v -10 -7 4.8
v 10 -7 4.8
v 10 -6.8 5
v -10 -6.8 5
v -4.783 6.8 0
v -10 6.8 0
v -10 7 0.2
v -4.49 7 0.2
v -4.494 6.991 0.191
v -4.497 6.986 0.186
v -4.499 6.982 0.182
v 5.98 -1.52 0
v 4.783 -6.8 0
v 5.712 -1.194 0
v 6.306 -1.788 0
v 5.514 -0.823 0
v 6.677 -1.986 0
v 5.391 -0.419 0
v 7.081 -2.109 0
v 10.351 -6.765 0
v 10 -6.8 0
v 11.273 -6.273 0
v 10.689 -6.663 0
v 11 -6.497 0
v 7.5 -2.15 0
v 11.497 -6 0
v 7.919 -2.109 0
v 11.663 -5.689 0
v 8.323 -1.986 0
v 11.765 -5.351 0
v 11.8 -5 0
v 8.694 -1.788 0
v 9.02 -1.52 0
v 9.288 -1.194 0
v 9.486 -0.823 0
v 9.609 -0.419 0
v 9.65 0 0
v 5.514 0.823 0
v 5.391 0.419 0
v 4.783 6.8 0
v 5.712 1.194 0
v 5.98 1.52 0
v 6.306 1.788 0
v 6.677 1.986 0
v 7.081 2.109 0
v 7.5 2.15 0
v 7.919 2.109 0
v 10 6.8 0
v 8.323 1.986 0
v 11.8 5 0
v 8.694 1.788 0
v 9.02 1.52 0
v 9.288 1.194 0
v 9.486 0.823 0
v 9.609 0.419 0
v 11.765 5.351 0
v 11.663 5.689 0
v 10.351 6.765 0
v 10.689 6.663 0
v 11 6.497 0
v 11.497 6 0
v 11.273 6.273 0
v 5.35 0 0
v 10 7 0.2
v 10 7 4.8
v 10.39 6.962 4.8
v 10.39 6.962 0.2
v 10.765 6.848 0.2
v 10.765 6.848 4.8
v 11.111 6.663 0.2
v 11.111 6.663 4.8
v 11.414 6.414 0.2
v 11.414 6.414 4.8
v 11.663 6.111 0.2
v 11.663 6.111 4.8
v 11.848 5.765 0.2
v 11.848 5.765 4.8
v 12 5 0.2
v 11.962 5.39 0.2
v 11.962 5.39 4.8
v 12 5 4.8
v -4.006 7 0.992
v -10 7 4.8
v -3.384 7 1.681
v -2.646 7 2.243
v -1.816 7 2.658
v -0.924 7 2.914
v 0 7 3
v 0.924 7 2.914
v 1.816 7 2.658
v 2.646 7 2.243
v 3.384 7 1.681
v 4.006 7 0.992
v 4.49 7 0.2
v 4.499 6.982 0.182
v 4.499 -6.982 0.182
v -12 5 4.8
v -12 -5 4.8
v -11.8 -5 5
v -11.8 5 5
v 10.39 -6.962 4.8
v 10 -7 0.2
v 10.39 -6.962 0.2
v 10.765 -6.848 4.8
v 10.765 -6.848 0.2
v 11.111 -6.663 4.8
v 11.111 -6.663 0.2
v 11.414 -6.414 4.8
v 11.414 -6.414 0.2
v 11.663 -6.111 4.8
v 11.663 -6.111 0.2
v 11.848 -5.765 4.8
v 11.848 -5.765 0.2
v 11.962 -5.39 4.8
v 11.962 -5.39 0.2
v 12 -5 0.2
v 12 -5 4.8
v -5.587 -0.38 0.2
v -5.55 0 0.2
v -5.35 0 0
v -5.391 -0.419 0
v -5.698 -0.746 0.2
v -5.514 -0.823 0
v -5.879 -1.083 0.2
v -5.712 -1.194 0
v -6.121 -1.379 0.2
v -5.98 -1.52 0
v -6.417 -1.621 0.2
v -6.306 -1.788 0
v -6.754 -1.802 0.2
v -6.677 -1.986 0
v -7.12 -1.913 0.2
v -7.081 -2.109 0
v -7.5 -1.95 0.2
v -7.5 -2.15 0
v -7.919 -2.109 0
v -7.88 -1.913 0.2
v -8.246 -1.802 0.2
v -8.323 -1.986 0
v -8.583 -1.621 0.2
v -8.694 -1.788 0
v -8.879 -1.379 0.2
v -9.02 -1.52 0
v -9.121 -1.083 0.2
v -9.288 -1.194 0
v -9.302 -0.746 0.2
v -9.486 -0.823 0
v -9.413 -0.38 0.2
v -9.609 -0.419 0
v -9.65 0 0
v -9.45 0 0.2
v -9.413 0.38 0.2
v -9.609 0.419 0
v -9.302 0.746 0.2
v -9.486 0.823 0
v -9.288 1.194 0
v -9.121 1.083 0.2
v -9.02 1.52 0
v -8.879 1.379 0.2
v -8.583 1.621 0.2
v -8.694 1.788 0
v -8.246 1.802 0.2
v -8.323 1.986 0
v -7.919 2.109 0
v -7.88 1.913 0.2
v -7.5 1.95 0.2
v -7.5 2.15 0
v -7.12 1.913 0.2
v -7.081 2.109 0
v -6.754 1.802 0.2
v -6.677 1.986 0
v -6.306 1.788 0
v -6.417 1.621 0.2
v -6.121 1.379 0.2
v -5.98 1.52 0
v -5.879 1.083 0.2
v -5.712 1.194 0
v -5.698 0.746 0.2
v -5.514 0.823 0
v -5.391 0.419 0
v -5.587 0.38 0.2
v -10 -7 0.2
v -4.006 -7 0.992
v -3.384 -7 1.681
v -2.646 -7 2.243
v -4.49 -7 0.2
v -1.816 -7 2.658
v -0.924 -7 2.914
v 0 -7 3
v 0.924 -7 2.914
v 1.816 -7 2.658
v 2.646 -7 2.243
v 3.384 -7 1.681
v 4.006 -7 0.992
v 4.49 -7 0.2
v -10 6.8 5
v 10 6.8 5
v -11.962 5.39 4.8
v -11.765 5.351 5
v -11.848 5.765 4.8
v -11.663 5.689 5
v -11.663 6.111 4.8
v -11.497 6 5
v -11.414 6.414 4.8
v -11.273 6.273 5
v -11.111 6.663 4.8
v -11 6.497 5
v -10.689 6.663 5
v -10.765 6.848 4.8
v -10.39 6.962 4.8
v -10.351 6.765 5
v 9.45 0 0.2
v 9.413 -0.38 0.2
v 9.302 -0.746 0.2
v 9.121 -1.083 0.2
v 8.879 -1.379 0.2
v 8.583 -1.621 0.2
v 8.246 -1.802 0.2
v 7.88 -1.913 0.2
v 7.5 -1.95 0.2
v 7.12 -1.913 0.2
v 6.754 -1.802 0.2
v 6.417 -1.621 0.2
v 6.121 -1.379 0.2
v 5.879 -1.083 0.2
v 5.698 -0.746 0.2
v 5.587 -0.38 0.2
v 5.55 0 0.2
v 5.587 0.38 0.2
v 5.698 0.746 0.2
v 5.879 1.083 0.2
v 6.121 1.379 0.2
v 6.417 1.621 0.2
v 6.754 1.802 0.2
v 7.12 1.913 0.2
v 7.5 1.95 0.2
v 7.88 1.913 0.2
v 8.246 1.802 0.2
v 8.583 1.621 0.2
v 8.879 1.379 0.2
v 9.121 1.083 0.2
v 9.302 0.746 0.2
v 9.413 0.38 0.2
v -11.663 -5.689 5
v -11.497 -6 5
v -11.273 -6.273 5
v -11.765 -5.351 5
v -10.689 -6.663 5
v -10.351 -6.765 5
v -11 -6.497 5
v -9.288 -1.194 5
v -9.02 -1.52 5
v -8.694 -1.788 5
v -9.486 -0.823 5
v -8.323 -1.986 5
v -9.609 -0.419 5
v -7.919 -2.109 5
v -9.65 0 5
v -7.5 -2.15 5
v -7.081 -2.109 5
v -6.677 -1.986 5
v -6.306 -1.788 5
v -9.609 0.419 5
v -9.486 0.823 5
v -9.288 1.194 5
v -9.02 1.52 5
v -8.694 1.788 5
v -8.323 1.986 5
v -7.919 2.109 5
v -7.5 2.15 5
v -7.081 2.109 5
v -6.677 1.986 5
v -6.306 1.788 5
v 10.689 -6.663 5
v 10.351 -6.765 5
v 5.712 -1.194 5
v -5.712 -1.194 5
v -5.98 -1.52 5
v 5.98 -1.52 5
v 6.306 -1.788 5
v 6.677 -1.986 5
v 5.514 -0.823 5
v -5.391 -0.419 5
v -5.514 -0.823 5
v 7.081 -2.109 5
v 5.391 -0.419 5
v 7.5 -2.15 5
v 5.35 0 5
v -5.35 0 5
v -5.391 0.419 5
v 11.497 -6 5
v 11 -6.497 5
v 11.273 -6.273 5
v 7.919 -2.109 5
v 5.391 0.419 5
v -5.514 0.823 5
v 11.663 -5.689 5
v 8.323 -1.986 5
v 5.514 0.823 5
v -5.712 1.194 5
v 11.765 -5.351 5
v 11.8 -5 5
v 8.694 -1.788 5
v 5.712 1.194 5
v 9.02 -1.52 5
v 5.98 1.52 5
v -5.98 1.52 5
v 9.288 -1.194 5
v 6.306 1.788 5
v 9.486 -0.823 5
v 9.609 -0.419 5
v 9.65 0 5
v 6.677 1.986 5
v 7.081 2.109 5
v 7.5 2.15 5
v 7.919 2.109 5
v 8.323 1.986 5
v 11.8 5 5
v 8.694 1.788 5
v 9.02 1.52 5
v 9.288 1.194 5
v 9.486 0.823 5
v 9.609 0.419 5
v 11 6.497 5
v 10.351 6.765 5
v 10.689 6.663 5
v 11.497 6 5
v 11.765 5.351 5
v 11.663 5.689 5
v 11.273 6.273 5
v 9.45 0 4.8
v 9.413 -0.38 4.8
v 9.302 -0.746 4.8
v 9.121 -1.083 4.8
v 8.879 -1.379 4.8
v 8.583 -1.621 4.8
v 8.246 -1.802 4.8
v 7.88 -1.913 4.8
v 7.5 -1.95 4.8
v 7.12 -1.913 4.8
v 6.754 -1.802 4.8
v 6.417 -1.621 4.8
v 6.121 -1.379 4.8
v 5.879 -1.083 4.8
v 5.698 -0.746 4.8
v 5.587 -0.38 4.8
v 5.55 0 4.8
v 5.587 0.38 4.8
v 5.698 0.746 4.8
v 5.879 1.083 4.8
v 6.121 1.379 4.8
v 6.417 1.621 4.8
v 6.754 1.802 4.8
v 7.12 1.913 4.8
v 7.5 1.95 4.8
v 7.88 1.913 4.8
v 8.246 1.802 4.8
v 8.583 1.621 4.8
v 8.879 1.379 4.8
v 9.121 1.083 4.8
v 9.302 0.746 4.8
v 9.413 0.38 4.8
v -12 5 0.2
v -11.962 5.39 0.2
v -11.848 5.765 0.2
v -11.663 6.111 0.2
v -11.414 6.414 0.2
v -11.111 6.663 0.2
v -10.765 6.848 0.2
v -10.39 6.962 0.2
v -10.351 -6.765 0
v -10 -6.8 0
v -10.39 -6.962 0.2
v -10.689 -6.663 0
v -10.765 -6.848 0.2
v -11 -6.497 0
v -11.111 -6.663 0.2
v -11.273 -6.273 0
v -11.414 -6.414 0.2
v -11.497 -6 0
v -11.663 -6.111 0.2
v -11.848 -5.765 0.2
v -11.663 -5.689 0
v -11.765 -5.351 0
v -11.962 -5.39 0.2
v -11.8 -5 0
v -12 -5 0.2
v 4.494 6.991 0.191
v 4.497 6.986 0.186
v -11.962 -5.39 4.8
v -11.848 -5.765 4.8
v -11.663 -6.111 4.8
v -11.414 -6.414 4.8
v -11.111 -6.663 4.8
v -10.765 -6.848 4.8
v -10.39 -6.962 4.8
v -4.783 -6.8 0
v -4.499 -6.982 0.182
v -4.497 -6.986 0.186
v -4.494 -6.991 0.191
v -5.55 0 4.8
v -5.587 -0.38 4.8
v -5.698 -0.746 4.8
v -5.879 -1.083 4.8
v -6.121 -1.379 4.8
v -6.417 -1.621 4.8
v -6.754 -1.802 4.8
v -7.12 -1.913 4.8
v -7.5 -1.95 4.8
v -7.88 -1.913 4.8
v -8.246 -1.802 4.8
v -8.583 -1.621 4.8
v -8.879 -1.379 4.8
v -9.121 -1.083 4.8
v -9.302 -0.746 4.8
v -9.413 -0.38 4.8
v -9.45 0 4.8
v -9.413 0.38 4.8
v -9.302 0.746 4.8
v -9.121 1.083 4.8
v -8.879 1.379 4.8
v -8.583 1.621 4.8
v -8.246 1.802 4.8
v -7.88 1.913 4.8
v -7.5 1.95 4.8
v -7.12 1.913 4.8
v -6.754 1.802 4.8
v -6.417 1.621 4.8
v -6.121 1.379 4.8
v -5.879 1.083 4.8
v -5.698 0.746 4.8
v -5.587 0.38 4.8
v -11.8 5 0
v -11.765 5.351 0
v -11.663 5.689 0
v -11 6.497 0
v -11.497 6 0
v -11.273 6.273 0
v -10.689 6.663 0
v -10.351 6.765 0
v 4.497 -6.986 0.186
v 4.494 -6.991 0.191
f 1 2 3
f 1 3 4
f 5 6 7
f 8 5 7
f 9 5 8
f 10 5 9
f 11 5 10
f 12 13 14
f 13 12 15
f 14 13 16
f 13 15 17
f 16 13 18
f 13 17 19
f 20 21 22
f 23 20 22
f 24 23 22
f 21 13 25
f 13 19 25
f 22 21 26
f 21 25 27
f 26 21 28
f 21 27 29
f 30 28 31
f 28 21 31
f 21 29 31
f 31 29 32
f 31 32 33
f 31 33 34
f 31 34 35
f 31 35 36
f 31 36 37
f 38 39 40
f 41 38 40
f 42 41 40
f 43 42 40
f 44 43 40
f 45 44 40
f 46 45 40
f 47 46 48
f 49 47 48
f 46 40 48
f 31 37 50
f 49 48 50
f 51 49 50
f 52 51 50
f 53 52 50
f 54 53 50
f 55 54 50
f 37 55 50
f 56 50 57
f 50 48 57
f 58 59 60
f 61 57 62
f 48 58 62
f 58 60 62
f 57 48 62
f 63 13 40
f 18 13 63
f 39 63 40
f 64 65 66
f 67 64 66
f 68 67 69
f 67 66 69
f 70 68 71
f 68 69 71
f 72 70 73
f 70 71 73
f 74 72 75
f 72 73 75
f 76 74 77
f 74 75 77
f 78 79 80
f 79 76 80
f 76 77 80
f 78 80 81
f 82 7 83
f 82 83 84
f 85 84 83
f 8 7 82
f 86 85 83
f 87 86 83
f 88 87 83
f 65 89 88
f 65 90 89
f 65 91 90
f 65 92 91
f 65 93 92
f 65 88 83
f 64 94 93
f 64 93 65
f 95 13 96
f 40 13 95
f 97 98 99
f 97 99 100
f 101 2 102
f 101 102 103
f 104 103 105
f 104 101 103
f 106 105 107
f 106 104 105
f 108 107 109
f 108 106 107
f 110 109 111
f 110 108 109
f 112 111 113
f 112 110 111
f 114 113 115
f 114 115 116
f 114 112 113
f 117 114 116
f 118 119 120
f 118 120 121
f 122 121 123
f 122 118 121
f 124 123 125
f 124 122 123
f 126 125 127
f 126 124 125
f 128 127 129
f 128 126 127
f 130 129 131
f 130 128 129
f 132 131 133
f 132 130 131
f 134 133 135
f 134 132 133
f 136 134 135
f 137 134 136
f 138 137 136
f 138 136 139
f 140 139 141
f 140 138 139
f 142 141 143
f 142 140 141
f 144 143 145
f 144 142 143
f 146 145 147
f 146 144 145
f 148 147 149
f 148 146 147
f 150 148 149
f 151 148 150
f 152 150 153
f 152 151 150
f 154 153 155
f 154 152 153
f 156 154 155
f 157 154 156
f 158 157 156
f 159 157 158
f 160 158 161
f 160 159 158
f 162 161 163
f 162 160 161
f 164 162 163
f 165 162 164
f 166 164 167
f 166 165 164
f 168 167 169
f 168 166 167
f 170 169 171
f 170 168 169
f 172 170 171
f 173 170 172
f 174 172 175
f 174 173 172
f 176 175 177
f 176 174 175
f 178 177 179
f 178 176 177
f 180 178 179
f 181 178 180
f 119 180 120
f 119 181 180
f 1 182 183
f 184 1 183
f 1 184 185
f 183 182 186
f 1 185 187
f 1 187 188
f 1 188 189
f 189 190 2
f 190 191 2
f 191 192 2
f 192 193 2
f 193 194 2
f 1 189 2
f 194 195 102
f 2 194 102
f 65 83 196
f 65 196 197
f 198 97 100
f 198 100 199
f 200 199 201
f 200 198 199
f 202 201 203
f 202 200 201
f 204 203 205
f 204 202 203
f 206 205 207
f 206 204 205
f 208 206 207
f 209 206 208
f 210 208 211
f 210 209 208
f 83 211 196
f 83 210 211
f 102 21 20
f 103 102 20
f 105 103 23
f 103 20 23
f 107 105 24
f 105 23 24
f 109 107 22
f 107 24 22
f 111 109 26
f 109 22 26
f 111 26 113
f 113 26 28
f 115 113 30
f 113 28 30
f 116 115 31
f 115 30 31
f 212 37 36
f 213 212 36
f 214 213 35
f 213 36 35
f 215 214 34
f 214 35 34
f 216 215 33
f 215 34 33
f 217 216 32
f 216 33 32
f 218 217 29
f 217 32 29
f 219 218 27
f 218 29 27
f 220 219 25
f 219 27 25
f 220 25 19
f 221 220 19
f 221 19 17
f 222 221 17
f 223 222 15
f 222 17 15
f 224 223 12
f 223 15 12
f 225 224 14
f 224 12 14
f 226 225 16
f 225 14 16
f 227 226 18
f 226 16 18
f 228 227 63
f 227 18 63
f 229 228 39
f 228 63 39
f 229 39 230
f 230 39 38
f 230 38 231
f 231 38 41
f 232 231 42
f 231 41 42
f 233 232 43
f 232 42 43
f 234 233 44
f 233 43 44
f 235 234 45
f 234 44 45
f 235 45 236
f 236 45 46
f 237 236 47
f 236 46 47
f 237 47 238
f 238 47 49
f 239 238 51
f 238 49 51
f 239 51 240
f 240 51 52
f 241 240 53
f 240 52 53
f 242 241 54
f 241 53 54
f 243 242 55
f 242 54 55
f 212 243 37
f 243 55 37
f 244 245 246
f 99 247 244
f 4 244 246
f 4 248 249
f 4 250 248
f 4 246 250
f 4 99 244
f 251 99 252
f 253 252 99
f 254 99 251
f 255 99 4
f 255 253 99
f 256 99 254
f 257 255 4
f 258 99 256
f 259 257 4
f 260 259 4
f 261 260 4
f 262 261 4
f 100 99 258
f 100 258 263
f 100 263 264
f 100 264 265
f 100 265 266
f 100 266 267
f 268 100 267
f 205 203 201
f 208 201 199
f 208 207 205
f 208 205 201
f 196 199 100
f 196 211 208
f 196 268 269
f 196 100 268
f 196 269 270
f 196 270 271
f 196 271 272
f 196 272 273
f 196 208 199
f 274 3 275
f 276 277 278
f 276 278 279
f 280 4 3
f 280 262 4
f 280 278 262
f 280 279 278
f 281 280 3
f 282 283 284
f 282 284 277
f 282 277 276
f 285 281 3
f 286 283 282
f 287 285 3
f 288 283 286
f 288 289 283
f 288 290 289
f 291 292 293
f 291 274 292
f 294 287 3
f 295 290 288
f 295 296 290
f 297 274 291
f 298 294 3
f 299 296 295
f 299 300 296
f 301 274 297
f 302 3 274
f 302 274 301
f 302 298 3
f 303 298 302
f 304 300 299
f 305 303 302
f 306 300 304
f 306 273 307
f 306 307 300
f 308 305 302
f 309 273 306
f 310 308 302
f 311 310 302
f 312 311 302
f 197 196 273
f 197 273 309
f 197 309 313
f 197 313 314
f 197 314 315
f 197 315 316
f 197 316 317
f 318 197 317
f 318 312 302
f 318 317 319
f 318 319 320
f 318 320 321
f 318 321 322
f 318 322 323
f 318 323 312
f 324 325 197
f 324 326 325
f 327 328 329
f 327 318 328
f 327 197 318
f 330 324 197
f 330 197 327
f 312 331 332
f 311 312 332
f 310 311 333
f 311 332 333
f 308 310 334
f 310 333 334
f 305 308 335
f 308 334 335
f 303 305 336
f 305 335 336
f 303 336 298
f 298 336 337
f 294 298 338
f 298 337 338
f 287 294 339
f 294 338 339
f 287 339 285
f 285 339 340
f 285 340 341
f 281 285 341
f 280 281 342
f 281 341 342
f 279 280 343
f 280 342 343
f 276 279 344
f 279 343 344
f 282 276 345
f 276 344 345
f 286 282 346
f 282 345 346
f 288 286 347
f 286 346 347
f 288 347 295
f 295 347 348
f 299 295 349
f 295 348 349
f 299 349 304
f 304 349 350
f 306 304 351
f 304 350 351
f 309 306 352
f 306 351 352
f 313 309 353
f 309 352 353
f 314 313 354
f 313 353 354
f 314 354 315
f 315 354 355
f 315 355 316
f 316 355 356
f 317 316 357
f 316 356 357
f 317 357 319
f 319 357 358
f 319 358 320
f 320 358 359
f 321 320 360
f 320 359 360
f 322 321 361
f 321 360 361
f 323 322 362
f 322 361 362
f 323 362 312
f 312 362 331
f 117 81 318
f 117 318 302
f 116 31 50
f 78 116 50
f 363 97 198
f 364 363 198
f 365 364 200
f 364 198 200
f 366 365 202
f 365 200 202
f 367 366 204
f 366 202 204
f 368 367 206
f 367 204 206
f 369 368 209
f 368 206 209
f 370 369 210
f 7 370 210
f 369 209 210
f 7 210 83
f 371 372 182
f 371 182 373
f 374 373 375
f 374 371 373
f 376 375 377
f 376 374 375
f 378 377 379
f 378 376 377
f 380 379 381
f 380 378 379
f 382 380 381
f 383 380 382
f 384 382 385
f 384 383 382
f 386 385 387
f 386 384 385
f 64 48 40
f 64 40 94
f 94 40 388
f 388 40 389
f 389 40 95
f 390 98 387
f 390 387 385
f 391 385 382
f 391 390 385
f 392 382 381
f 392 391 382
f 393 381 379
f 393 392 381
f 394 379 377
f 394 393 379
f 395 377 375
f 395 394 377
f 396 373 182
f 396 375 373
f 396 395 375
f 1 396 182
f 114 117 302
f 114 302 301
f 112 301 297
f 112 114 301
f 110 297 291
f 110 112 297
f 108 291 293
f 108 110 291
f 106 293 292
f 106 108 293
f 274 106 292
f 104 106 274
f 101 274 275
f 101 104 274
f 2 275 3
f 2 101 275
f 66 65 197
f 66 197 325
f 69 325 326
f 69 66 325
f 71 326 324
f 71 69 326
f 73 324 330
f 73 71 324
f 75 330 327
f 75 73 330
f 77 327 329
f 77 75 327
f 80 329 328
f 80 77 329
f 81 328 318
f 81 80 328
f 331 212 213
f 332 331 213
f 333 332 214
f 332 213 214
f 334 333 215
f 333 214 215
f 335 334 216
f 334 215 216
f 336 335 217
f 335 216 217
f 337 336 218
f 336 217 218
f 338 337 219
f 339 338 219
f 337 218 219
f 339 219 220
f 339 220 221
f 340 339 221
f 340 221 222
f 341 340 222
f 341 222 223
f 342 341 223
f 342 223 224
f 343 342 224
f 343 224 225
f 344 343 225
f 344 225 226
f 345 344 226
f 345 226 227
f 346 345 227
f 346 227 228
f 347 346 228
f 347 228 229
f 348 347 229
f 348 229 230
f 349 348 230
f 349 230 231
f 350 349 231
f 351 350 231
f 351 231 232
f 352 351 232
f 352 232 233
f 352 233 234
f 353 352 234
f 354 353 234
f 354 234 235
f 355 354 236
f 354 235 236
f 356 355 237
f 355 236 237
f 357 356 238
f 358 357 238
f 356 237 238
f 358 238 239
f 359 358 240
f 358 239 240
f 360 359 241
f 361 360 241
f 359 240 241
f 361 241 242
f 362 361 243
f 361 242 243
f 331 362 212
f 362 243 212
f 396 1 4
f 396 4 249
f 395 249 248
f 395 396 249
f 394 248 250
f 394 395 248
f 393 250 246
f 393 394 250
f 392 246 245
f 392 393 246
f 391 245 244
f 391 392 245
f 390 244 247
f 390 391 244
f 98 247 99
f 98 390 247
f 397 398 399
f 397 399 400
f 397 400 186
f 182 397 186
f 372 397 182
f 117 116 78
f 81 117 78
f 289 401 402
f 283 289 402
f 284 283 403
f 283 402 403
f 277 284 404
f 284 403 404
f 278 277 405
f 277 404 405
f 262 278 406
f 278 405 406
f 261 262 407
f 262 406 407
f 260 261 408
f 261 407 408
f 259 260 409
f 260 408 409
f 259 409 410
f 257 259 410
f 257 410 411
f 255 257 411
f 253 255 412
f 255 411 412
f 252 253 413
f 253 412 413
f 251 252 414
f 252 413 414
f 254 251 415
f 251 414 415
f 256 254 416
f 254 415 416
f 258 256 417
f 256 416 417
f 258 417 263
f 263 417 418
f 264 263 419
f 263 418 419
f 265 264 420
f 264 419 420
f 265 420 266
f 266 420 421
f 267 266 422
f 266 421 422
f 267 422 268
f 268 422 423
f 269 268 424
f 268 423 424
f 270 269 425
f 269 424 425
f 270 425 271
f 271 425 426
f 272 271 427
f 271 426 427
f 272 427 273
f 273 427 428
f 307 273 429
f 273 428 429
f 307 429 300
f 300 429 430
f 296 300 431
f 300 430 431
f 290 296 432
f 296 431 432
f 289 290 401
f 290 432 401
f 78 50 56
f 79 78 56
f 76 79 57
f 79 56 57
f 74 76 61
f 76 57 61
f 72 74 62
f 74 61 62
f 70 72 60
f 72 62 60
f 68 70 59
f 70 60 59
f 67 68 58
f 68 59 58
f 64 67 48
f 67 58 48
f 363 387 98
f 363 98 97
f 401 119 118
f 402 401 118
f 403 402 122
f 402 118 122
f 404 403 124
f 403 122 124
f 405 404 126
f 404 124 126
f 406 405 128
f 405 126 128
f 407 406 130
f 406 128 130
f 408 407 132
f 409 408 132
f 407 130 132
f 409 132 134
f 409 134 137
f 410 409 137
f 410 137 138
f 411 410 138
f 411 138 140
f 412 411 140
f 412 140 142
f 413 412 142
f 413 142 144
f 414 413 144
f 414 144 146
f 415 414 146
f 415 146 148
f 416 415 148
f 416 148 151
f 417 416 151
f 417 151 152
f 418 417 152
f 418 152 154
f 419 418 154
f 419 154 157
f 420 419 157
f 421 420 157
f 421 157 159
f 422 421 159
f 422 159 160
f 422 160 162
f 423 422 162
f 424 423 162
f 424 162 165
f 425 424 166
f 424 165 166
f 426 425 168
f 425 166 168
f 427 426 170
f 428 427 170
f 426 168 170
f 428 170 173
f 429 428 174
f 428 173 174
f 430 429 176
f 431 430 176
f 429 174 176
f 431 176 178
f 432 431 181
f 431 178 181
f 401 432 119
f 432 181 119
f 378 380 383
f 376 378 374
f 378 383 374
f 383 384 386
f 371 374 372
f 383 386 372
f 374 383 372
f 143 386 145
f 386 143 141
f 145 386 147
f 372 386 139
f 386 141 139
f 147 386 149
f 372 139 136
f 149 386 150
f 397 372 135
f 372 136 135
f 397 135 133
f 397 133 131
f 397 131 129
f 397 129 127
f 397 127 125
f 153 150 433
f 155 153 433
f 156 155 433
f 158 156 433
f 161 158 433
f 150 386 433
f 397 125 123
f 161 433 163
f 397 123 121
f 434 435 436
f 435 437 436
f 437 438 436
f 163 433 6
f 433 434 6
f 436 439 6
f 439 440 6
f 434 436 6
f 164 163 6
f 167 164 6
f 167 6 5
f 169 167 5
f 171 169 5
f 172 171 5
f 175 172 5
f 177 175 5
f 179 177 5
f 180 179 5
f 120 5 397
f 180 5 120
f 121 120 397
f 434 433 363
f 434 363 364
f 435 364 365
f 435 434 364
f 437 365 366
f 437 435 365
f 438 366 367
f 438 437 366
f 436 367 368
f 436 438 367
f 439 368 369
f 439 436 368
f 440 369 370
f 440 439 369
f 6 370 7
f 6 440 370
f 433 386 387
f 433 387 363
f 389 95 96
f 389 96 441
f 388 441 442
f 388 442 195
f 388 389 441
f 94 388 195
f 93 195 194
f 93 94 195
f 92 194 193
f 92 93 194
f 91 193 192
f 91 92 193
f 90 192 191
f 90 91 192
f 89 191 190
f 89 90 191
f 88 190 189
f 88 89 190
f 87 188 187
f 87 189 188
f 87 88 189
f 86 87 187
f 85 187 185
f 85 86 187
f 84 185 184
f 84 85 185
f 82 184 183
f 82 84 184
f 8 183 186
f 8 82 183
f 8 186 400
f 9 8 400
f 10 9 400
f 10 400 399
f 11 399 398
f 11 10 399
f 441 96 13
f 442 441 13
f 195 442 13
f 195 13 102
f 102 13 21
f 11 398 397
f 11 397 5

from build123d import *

# Parameters (mm, degrees)
CYLINDER_R          = 5
CYLINDER_DEPTH      = 20
CYLINDER_ROLL_ANGLE = 90
BOX_W               = 24
BOX_H               = 14
BOX_DEPTH           = 5
SKETCH001_R         = 1.95
POCKET_DEPTH        = 15
FILLET_R            = 2
CHAMFER_SIZE        = 0.2
CHAMFER001_SIZE     = 0.2


with BuildPart() as zylinder:
    # Cylinder → Cylinder (new body)
    with BuildSketch(Plane.XY):
        Circle(CYLINDER_R)
    extrude(amount=CYLINDER_DEPTH)


with BuildPart() as zylinder_1:
    # Cylinder roll: moved
    add(zylinder.part.rotate(Axis((0, 0, 0), (1, 0, 0)), CYLINDER_ROLL_ANGLE))


with BuildPart() as zylinder_2:
    # Cylinder placement: moved
    add(zylinder_1.part.moved(Location((0, 10, -2))))


with BuildPart() as chamfer001:
    # Box → Box (new body)
    with BuildSketch(Plane(origin=(-12, -7, 0), x_dir=(1, 0, 0), z_dir=(0, 0, 1))):
        with Locations((12, 7)):
            Rectangle(BOX_W, BOX_H)
    extrude(amount=BOX_DEPTH)

    # Cut: cut Zylinder
    add(zylinder_2.part, mode=Mode.SUBTRACT)

    # Sketch001 → Pocket (cut)
    with BuildSketch(Plane(origin=(0, 0, 0), x_dir=(1, 0, 0), z_dir=(0, 0, -1))):
        with Locations((-7.5, 0)):
            Circle(SKETCH001_R)
        with Locations((7.5, 0)):
            Circle(SKETCH001_R)
    extrude(amount=-POCKET_DEPTH, mode=Mode.SUBTRACT)

    # Fillet
    fillet_edges = [chamfer001.edges().sort_by_distance(p)[0] for p in [
        (-12, 7, 2.5),
        (-12, -7, 2.5),
        (12, -7, 2.5),
        (12, 7, 2.5),
    ]]
    fillet(fillet_edges, radius=FILLET_R)

    # Chamfer
    chamfer_edges = [chamfer001.edges().sort_by_distance(p)[0] for p in [
        (-12, 0, 0),
        (-11.414214, 6.414214, 0),
        (-7.291288, 7, 0),
        (-4.582576, 0, 0),
        (-7.291288, -7, 0),
        (-11.414214, -6.414214, 0),
        (4.582576, 0, 0),
        (7.291288, -7, 0),
        (11.414214, -6.414214, 0),
        (12, 0, 0),
        (11.414214, 6.414214, 0),
        (7.291288, 7, 0),
        (-9.45, 0, 0),
        (5.55, 0, 0),
    ]]
    chamfer(chamfer_edges, length=CHAMFER_SIZE)

    # Chamfer001
    chamfer001_edges = [chamfer001.edges().sort_by_distance(p)[0] for p in [
        (0, 7, 5),
        (11.414214, 6.414214, 5),
        (12, 0, 5),
        (11.414214, -6.414214, 5),
        (0, -7, 5),
        (-11.414214, -6.414214, 5),
        (-12, 0, 5),
        (-11.414214, 6.414214, 5),
        (-9.45, 0, 5),
        (5.55, 0, 5),
    ]]
    chamfer(chamfer001_edges, length=CHAMFER001_SIZE)


solid = chamfer001.part
